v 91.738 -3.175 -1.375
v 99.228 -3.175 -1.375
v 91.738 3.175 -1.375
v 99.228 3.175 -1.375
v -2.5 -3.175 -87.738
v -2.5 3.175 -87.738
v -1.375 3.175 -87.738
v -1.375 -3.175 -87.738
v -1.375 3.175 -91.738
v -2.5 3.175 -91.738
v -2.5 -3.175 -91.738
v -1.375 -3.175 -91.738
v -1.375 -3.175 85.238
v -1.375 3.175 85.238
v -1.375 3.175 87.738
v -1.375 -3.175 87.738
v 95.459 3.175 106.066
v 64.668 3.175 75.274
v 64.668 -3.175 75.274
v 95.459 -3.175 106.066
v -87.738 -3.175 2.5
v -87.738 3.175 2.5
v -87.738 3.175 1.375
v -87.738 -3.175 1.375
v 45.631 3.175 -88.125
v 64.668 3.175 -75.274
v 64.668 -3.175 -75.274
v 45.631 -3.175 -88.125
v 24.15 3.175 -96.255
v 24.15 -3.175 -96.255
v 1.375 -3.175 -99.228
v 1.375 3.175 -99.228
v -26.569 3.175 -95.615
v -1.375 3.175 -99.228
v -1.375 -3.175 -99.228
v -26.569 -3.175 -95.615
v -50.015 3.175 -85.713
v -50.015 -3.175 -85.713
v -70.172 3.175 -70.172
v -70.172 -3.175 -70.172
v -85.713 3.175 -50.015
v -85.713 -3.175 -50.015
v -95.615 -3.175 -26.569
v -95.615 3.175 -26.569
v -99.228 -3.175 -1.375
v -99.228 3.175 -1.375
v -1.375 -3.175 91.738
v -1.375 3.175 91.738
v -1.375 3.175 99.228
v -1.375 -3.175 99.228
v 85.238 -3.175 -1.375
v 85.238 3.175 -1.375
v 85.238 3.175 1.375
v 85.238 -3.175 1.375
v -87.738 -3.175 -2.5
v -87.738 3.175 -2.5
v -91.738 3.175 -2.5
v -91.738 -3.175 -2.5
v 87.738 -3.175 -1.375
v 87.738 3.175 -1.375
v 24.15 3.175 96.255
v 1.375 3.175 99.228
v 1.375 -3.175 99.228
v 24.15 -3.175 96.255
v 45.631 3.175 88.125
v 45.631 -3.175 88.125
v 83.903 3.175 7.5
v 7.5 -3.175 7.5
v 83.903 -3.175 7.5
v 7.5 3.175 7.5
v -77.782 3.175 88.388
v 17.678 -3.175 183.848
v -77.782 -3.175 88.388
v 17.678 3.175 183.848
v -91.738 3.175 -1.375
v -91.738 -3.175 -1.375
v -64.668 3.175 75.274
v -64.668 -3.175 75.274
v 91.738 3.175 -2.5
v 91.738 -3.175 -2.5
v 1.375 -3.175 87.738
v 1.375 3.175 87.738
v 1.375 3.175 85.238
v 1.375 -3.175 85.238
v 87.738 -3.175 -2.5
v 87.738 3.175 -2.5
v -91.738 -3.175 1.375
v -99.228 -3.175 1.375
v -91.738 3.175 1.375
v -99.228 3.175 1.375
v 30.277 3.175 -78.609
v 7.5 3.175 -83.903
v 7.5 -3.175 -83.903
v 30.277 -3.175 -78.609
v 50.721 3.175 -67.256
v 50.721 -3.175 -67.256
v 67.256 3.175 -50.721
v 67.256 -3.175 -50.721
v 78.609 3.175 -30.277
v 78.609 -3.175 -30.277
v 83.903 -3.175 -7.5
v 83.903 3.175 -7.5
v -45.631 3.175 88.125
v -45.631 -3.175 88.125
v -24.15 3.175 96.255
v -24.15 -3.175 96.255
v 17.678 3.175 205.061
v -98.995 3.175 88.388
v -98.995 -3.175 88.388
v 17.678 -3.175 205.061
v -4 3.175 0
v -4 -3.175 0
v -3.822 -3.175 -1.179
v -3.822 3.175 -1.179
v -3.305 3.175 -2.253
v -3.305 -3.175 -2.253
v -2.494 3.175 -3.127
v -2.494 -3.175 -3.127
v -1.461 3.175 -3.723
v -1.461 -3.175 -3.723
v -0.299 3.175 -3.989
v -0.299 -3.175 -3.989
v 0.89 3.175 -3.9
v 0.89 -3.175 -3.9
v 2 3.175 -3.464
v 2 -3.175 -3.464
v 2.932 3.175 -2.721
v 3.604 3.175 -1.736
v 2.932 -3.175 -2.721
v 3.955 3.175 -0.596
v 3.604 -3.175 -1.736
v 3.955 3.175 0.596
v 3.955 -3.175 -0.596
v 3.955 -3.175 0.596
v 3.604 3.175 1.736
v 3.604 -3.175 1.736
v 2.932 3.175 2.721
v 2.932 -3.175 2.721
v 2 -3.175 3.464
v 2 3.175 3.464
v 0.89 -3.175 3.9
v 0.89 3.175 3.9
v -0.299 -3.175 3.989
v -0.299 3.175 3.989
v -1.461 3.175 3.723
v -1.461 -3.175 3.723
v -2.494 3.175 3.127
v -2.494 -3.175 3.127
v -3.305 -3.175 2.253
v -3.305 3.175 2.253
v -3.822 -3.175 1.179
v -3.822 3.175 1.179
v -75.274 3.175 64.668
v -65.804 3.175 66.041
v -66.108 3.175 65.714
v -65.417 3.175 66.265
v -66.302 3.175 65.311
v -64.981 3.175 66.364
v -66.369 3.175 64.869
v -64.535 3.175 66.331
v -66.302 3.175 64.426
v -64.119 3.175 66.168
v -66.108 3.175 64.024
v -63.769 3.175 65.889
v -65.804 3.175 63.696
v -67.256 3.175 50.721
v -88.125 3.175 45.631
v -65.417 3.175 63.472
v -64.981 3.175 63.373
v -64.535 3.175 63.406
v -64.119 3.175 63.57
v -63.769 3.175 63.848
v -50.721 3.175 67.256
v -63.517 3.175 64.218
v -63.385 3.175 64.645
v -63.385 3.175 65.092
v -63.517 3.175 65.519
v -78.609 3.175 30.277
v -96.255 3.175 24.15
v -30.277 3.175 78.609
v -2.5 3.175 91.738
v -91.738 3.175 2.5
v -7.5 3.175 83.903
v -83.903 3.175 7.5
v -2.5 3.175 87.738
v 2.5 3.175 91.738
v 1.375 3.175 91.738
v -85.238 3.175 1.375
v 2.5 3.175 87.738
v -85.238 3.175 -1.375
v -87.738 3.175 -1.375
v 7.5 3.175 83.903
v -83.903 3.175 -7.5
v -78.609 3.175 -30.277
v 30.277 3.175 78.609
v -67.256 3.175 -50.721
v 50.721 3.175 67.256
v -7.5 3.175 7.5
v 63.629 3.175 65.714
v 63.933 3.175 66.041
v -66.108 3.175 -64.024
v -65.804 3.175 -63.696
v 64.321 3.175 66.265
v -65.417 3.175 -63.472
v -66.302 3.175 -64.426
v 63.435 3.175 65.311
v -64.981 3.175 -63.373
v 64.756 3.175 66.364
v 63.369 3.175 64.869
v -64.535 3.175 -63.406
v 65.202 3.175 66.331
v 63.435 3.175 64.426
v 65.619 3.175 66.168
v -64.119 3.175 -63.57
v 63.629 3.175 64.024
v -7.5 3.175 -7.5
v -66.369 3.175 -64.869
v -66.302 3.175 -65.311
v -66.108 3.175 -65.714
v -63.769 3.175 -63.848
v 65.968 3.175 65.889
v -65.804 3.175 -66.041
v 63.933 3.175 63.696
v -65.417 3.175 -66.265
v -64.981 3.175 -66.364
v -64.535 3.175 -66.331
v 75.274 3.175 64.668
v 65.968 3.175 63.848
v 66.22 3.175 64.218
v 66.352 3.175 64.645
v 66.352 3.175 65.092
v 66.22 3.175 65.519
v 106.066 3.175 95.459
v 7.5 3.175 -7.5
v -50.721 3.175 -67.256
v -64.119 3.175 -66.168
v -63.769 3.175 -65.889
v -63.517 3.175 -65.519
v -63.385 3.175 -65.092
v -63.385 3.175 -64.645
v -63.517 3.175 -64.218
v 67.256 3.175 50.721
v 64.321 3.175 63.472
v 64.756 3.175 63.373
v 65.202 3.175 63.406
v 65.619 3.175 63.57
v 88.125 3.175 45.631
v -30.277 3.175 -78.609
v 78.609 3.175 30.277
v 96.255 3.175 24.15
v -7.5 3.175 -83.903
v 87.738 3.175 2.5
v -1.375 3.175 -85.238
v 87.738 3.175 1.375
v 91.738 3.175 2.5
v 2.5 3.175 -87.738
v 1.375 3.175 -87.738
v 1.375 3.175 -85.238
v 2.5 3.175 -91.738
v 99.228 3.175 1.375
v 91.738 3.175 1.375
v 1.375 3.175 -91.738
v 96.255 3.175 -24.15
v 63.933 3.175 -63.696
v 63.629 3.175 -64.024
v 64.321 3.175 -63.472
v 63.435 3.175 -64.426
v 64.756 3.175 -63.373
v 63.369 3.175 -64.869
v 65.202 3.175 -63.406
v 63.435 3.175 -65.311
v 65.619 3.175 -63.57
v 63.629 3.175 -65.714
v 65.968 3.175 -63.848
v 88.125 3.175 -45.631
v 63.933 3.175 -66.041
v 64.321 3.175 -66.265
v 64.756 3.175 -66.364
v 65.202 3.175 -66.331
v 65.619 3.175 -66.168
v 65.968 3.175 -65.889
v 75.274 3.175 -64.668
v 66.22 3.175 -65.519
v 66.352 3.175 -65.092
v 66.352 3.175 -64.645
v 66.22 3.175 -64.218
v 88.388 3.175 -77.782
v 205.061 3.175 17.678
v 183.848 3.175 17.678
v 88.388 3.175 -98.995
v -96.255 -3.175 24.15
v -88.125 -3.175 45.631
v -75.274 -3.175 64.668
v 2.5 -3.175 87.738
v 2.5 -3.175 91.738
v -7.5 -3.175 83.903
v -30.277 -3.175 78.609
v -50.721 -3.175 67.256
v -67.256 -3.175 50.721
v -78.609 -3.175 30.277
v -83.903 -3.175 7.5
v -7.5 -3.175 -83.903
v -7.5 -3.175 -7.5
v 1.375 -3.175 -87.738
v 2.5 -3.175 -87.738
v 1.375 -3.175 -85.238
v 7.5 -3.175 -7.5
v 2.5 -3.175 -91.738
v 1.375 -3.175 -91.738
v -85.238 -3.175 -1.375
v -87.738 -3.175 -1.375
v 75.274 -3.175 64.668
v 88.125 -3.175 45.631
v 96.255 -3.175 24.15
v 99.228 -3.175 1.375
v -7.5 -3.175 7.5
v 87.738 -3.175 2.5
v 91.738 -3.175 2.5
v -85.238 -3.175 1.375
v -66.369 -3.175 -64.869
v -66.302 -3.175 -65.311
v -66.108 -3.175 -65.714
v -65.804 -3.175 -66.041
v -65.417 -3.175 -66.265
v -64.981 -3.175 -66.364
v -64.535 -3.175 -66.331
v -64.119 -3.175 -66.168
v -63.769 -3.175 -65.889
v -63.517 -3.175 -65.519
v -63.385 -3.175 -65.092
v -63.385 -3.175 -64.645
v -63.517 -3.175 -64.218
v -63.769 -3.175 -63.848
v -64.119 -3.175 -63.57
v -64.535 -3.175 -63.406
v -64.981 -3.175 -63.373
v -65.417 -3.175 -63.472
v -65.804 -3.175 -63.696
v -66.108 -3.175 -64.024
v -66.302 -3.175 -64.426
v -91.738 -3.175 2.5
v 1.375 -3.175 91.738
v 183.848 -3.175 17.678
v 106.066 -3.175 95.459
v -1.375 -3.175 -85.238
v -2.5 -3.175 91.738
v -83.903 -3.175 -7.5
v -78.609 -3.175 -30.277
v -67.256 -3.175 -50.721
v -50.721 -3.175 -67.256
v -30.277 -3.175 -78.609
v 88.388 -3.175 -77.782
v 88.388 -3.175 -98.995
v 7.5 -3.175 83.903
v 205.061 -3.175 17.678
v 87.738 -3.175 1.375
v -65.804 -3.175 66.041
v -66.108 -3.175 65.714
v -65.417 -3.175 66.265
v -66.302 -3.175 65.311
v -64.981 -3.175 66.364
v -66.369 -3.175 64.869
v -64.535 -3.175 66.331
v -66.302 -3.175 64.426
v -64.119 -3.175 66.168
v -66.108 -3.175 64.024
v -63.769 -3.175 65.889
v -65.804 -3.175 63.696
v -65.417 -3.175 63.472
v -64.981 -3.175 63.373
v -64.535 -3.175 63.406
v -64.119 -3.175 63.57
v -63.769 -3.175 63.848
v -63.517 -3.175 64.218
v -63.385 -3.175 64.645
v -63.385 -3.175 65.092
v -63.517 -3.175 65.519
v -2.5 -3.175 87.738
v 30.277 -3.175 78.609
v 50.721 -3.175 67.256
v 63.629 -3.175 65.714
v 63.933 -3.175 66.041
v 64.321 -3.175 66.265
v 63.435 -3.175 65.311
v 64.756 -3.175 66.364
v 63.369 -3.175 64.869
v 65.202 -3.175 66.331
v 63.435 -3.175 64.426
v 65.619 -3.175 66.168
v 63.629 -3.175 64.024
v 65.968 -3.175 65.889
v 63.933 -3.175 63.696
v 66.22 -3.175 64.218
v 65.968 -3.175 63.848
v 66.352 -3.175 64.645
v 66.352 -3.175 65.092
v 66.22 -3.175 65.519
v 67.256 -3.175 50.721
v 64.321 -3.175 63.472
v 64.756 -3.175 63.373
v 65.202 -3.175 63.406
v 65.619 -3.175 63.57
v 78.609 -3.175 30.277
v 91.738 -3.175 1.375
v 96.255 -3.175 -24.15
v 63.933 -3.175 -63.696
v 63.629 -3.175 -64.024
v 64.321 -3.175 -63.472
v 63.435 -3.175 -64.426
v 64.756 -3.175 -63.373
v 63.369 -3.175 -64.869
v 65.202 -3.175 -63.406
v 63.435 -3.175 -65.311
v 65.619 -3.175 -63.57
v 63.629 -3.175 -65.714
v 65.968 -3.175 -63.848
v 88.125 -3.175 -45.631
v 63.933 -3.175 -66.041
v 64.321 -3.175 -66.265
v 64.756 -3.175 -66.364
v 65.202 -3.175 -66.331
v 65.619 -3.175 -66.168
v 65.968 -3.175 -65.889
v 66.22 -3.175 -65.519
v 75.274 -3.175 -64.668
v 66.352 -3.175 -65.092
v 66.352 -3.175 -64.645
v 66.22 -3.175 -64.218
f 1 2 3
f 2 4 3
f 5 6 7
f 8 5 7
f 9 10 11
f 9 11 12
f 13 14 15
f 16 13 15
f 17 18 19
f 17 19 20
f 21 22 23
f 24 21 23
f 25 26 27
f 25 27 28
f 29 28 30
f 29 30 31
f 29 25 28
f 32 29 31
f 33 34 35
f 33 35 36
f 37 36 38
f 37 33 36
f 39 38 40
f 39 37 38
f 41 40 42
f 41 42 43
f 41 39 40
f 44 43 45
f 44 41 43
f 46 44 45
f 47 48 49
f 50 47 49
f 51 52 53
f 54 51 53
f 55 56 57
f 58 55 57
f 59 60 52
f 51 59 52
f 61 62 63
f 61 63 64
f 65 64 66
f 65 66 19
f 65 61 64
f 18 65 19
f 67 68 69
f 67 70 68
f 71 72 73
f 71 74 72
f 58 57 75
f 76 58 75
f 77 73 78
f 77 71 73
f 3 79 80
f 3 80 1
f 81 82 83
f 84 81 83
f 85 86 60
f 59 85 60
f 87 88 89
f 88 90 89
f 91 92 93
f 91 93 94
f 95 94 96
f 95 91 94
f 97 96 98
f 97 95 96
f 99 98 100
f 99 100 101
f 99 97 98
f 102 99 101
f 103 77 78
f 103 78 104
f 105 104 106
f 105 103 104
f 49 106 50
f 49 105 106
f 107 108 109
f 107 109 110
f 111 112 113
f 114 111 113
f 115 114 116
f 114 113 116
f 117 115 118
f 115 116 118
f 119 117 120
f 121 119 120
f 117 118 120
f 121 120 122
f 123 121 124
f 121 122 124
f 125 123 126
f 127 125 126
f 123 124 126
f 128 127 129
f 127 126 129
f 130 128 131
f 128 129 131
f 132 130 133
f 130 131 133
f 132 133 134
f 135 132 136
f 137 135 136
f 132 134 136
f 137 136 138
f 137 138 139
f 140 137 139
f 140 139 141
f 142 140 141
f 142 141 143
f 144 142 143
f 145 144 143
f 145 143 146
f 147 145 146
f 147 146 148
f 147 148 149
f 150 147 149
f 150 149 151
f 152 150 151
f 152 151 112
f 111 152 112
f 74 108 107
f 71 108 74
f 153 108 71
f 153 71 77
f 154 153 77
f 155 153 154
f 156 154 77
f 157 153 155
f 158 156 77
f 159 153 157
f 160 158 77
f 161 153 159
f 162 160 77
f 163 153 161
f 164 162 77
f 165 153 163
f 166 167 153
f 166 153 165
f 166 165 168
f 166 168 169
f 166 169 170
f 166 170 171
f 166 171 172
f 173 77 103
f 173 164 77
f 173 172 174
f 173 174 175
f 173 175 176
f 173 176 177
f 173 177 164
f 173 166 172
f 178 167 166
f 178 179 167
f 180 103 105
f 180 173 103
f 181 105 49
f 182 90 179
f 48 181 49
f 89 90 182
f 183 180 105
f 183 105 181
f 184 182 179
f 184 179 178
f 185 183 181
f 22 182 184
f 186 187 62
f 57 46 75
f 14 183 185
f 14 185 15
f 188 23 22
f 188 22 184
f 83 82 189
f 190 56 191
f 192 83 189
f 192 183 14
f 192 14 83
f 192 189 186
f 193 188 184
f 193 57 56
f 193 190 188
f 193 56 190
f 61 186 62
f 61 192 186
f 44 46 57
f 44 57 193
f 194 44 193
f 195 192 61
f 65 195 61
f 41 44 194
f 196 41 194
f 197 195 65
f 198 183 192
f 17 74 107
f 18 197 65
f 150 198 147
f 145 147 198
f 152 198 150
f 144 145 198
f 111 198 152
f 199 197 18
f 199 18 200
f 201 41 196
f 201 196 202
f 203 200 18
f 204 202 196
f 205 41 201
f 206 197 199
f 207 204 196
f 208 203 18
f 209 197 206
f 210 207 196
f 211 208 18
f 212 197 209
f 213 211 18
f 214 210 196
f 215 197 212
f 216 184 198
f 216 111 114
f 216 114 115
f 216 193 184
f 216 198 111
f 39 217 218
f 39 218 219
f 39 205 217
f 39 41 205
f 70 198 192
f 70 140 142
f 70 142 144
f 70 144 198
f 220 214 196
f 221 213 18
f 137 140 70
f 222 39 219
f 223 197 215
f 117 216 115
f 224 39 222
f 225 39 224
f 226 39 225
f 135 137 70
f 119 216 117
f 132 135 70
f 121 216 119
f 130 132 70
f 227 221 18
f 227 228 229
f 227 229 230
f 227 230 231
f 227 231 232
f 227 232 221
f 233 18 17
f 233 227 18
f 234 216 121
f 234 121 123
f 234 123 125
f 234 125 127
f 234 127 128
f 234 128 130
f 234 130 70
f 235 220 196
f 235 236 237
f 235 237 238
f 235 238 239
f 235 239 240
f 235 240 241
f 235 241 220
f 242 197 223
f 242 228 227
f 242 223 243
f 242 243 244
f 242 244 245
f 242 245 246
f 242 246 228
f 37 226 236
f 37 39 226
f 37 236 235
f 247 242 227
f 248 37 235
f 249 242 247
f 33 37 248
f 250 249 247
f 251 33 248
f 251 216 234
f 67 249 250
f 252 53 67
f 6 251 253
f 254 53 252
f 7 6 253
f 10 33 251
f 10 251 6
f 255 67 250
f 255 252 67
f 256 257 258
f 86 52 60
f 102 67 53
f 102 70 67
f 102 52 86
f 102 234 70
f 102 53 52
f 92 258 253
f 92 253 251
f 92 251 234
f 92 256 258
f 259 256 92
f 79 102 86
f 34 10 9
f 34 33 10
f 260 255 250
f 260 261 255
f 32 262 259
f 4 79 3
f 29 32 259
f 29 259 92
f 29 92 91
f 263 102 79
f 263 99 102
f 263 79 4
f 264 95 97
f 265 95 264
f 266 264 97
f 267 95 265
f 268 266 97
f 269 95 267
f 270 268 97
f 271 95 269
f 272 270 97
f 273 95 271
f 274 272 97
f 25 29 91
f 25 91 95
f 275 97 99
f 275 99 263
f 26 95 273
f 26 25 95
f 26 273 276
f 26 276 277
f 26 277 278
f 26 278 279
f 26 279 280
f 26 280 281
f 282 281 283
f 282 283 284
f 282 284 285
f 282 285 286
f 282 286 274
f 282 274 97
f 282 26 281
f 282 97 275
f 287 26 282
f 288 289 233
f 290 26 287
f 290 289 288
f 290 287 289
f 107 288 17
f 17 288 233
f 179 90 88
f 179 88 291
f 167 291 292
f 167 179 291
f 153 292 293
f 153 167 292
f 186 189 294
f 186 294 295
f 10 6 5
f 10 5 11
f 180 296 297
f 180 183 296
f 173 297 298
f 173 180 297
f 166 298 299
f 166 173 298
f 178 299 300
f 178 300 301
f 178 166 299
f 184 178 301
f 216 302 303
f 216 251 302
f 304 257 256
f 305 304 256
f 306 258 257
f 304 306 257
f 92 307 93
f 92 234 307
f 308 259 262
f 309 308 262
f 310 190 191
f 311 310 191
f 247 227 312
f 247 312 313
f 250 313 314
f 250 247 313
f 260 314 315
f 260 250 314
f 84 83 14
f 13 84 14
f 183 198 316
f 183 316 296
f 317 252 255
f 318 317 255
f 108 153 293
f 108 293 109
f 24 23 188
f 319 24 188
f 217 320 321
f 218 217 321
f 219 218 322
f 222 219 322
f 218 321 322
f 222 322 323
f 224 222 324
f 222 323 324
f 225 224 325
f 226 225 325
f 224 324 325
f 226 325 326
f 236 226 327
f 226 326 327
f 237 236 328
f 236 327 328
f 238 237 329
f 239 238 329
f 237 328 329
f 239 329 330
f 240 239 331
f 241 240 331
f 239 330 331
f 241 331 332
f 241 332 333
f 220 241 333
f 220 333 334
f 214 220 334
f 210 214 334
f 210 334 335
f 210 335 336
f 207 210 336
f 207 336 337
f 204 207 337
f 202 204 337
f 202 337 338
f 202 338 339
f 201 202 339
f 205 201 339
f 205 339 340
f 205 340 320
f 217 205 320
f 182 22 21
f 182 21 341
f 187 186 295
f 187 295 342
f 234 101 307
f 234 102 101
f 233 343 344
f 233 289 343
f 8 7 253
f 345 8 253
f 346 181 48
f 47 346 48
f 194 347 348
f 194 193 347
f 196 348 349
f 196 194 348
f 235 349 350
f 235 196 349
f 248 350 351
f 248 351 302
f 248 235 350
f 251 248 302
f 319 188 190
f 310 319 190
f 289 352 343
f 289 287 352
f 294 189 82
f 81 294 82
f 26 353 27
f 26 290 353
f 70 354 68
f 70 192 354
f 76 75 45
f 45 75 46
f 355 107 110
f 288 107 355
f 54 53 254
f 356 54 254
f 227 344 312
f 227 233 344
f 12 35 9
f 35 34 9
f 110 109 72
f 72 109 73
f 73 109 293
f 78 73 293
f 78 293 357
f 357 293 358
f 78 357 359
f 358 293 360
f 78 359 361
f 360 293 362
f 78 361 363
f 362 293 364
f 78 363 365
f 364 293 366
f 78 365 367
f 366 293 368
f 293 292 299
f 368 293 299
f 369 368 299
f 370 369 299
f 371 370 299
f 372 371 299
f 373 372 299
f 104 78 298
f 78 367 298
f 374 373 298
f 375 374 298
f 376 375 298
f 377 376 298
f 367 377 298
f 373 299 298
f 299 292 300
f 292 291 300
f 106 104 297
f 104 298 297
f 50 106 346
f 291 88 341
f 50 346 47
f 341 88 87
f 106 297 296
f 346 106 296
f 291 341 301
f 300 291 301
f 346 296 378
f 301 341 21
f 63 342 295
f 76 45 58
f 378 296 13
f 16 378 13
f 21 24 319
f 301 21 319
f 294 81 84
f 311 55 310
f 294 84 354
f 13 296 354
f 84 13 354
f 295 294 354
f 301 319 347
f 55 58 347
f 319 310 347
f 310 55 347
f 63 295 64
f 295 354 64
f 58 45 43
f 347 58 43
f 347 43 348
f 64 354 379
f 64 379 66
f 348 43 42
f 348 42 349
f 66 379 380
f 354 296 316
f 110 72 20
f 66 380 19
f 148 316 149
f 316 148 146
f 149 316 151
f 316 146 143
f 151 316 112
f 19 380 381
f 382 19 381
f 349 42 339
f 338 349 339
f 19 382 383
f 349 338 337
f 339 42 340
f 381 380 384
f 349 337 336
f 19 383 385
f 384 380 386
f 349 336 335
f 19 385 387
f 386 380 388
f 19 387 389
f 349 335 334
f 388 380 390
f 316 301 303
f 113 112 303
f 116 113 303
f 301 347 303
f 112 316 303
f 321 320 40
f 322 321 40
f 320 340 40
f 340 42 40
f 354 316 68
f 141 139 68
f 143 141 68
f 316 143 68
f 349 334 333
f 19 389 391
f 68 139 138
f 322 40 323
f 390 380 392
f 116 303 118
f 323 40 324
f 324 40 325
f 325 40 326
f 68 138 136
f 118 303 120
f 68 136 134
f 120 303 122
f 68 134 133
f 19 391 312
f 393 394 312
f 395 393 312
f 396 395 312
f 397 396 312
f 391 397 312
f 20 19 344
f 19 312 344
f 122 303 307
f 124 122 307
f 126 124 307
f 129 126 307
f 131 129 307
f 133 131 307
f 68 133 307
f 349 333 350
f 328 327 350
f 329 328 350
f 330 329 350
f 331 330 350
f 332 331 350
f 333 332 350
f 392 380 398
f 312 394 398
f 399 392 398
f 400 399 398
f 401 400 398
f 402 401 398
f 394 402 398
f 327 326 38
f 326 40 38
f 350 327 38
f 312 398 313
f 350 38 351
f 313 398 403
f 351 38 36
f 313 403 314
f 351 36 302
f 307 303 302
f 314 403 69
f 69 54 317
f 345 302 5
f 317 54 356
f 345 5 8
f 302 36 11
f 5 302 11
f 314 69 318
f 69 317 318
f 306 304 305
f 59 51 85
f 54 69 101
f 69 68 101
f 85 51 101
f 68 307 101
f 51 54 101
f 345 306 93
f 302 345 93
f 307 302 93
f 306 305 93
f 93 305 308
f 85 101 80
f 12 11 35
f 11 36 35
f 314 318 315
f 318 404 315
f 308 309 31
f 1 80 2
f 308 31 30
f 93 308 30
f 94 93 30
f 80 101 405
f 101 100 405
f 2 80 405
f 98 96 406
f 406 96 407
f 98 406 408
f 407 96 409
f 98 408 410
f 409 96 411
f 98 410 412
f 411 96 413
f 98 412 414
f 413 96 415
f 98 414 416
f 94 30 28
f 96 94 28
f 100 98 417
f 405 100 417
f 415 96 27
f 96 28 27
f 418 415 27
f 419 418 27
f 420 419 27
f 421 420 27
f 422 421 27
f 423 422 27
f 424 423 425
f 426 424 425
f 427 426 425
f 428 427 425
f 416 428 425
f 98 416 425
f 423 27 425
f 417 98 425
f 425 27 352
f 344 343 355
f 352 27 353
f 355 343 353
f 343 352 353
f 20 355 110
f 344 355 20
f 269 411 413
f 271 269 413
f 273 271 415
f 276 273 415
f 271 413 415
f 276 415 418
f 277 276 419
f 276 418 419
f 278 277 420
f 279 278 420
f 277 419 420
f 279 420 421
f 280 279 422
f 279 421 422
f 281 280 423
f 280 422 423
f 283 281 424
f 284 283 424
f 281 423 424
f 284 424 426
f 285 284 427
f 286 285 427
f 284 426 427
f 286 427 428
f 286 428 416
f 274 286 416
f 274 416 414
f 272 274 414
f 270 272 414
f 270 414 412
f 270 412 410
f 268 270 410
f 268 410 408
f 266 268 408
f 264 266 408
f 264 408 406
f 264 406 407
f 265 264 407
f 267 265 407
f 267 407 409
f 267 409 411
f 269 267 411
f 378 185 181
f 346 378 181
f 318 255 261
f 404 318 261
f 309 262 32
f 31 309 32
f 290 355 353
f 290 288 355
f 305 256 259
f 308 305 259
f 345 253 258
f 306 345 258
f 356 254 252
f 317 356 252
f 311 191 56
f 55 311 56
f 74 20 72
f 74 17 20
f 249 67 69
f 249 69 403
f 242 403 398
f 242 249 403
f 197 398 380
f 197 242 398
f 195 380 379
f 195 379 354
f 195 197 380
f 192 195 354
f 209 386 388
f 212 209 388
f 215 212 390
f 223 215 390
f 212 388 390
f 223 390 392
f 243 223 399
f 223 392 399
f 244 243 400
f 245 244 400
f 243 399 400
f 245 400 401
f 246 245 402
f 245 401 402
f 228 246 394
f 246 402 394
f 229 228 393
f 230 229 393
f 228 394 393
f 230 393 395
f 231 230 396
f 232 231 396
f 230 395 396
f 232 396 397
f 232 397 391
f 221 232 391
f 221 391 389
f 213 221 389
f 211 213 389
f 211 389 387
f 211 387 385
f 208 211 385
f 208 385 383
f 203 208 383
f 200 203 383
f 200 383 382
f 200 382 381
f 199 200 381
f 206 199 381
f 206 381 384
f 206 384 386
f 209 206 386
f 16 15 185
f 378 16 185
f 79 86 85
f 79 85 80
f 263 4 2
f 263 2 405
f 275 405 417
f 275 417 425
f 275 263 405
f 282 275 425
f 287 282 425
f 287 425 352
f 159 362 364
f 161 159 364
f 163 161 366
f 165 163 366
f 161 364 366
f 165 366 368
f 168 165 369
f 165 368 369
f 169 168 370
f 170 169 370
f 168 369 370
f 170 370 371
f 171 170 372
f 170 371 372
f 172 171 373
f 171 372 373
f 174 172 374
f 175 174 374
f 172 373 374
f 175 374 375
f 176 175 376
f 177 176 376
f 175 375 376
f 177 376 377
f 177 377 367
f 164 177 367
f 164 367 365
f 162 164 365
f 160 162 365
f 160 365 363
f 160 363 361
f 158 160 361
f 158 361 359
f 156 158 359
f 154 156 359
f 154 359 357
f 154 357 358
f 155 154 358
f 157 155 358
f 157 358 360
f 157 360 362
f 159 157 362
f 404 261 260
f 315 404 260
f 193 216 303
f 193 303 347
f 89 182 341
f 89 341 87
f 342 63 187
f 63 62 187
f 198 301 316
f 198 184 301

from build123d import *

# Parameters (mm, degrees)
BOSS_EXTRUDE1_DEPTH          = 3.175
SKETCH2_W                    = 2.75
SKETCH2_H                    = 2.5
SKETCH2_H_2                  = 4
SKETCH2_W_2                  = 1.125
SKETCH2_H_3                  = 7.5
CUT_EXTRUDE1_DEPTH           = 291.017379867
CIRPATTERN1_COUNT            = 4
F_3_0_3_DIAMETER_HOLE1_D     = 3
F_8_0_8_DIAMETER_HOLE1_D     = 8
F_8_0_8_DIAMETER_HOLE1_DEPTH = 6.35


with BuildPart() as part:
    # Sketch1 → Boss-Extrude1 (new, symmetric)
    with BuildSketch(Plane(origin=(0, 0, 0), x_dir=(1, 0, 0), z_dir=(0, 1, 0))):
        with BuildLine():
            Line((88.388347648, 98.994949366), (64.667874078, 75.274475795))
            ThreePointArc((64.667874078, 75.274475795), (-70.171862751, 70.171862751), (-75.274475795, -64.667874078))
            Line((-75.274475795, -64.667874078), (-98.994949366, -88.388347648))
            Line((-98.994949366, -88.388347648), (17.67766953, -205.060966544))
            Line((17.67766953, -205.060966544), (205.060966544, -17.67766953))
            Line((205.060966544, -17.67766953), (88.388347648, 98.994949366))
        make_face()
        with BuildLine():
            ThreePointArc((-64.667874078, -75.274475795), (0, -99.238), (64.667874078, -75.274475795))
            Line((64.667874078, -75.274475795), (95.45941546, -106.066017178))
            Line((95.45941546, -106.066017178), (17.67766953, -183.847763109))
            Line((17.67766953, -183.847763109), (-77.781745931, -88.388347648))
            Line((-77.781745931, -88.388347648), (-64.667874078, -75.274475795))
        make_face(mode=Mode.SUBTRACT)
        with BuildLine():
            ThreePointArc((75.274475795, -64.667874078), (99.238, 0), (75.274475795, 64.667874078))
            Line((75.274475795, 64.667874078), (88.388347648, 77.781745931))
            Line((88.388347648, 77.781745931), (183.847763109, -17.67766953))
            Line((183.847763109, -17.67766953), (106.066017178, -95.45941546))
            Line((106.066017178, -95.45941546), (75.274475795, -64.667874078))
        make_face(mode=Mode.SUBTRACT)
        with BuildLine():
            Line((-7.5, -7.5), (-7.5, -83.903460262))
            ThreePointArc((-7.5, -83.903460262), (-59.565261034, -59.565261034), (-83.903460262, -7.5))
            Line((-83.903460262, -7.5), (-7.5, -7.5))
        make_face(mode=Mode.SUBTRACT)
        with BuildLine():
            ThreePointArc((83.903460262, -7.5), (59.565261034, -59.565261034), (7.5, -83.903460262))
            Line((7.5, -83.903460262), (7.5, -7.5))
            Line((7.5, -7.5), (83.903460262, -7.5))
        make_face(mode=Mode.SUBTRACT)
        with BuildLine():
            Line((-7.5, 7.5), (-83.903460262, 7.5))
            ThreePointArc((-83.903460262, 7.5), (-59.565261034, 59.565261034), (-7.5, 83.903460262))
            Line((-7.5, 83.903460262), (-7.5, 7.5))
        make_face(mode=Mode.SUBTRACT)
        with BuildLine():
            ThreePointArc((7.5, 83.903460262), (59.565261034, 59.565261034), (83.903460262, 7.5))
            Line((83.903460262, 7.5), (7.5, 7.5))
            Line((7.5, 7.5), (7.5, 83.903460262))
        make_face(mode=Mode.SUBTRACT)
    extrude(amount=BOSS_EXTRUDE1_DEPTH, both=True)

    # Sketch2 → Cut-Extrude1 (cut, symmetric)
    with BuildSketch(Plane(origin=(0, 0, 0), x_dir=(1, 0, 0), z_dir=(0, 1, 0))):
        with Locations((0, 86.488)):
            Rectangle(SKETCH2_W, SKETCH2_H)
        with Locations((0, 89.738)):
            Rectangle(SKETCH2_W, SKETCH2_H_2)
        with Locations((1.9375, 89.738)):
            Rectangle(SKETCH2_W_2, SKETCH2_H_2)
        with Locations((0, 95.488)):
            Rectangle(SKETCH2_W, SKETCH2_H_3)
        with Locations((-1.9375, 89.738)):
            Rectangle(SKETCH2_W_2, SKETCH2_H_2)
    cut_extrude1 = extrude(amount=CUT_EXTRUDE1_DEPTH, both=True, mode=Mode.SUBTRACT)

    # CirPattern1: Cut-Extrude1 ×4 about axis
    cirpattern1_axis = Axis((0, 0, 0), (0, 1, 0))
    for i in range(1, CIRPATTERN1_COUNT):
        add(cut_extrude1.rotate(cirpattern1_axis, i * 360 / CIRPATTERN1_COUNT), mode=Mode.SUBTRACT)

    # Ø3.0 (3) Diameter Hole1 (through all)
    with Locations(Plane(origin=(0, 3.175, 0), x_dir=(1, 0, 0), z_dir=(0, 1, 0))):
        with Locations((-64.868561892, -64.868561892), (0, 0), (-64.868561892, 64.868561892), (64.868561892, 64.868561892), (64.868561892, -64.868561892)):
            Hole(F_3_0_3_DIAMETER_HOLE1_D / 2)

    # Ø8.0 (8) Diameter Hole1
    with Locations(Plane(origin=(0, 3.175, 0), x_dir=(1, 0, 0), z_dir=(0, 1, 0))):
        with Locations((0, 0)):
            Hole(F_8_0_8_DIAMETER_HOLE1_D / 2, depth=F_8_0_8_DIAMETER_HOLE1_DEPTH)


solid = part.part
